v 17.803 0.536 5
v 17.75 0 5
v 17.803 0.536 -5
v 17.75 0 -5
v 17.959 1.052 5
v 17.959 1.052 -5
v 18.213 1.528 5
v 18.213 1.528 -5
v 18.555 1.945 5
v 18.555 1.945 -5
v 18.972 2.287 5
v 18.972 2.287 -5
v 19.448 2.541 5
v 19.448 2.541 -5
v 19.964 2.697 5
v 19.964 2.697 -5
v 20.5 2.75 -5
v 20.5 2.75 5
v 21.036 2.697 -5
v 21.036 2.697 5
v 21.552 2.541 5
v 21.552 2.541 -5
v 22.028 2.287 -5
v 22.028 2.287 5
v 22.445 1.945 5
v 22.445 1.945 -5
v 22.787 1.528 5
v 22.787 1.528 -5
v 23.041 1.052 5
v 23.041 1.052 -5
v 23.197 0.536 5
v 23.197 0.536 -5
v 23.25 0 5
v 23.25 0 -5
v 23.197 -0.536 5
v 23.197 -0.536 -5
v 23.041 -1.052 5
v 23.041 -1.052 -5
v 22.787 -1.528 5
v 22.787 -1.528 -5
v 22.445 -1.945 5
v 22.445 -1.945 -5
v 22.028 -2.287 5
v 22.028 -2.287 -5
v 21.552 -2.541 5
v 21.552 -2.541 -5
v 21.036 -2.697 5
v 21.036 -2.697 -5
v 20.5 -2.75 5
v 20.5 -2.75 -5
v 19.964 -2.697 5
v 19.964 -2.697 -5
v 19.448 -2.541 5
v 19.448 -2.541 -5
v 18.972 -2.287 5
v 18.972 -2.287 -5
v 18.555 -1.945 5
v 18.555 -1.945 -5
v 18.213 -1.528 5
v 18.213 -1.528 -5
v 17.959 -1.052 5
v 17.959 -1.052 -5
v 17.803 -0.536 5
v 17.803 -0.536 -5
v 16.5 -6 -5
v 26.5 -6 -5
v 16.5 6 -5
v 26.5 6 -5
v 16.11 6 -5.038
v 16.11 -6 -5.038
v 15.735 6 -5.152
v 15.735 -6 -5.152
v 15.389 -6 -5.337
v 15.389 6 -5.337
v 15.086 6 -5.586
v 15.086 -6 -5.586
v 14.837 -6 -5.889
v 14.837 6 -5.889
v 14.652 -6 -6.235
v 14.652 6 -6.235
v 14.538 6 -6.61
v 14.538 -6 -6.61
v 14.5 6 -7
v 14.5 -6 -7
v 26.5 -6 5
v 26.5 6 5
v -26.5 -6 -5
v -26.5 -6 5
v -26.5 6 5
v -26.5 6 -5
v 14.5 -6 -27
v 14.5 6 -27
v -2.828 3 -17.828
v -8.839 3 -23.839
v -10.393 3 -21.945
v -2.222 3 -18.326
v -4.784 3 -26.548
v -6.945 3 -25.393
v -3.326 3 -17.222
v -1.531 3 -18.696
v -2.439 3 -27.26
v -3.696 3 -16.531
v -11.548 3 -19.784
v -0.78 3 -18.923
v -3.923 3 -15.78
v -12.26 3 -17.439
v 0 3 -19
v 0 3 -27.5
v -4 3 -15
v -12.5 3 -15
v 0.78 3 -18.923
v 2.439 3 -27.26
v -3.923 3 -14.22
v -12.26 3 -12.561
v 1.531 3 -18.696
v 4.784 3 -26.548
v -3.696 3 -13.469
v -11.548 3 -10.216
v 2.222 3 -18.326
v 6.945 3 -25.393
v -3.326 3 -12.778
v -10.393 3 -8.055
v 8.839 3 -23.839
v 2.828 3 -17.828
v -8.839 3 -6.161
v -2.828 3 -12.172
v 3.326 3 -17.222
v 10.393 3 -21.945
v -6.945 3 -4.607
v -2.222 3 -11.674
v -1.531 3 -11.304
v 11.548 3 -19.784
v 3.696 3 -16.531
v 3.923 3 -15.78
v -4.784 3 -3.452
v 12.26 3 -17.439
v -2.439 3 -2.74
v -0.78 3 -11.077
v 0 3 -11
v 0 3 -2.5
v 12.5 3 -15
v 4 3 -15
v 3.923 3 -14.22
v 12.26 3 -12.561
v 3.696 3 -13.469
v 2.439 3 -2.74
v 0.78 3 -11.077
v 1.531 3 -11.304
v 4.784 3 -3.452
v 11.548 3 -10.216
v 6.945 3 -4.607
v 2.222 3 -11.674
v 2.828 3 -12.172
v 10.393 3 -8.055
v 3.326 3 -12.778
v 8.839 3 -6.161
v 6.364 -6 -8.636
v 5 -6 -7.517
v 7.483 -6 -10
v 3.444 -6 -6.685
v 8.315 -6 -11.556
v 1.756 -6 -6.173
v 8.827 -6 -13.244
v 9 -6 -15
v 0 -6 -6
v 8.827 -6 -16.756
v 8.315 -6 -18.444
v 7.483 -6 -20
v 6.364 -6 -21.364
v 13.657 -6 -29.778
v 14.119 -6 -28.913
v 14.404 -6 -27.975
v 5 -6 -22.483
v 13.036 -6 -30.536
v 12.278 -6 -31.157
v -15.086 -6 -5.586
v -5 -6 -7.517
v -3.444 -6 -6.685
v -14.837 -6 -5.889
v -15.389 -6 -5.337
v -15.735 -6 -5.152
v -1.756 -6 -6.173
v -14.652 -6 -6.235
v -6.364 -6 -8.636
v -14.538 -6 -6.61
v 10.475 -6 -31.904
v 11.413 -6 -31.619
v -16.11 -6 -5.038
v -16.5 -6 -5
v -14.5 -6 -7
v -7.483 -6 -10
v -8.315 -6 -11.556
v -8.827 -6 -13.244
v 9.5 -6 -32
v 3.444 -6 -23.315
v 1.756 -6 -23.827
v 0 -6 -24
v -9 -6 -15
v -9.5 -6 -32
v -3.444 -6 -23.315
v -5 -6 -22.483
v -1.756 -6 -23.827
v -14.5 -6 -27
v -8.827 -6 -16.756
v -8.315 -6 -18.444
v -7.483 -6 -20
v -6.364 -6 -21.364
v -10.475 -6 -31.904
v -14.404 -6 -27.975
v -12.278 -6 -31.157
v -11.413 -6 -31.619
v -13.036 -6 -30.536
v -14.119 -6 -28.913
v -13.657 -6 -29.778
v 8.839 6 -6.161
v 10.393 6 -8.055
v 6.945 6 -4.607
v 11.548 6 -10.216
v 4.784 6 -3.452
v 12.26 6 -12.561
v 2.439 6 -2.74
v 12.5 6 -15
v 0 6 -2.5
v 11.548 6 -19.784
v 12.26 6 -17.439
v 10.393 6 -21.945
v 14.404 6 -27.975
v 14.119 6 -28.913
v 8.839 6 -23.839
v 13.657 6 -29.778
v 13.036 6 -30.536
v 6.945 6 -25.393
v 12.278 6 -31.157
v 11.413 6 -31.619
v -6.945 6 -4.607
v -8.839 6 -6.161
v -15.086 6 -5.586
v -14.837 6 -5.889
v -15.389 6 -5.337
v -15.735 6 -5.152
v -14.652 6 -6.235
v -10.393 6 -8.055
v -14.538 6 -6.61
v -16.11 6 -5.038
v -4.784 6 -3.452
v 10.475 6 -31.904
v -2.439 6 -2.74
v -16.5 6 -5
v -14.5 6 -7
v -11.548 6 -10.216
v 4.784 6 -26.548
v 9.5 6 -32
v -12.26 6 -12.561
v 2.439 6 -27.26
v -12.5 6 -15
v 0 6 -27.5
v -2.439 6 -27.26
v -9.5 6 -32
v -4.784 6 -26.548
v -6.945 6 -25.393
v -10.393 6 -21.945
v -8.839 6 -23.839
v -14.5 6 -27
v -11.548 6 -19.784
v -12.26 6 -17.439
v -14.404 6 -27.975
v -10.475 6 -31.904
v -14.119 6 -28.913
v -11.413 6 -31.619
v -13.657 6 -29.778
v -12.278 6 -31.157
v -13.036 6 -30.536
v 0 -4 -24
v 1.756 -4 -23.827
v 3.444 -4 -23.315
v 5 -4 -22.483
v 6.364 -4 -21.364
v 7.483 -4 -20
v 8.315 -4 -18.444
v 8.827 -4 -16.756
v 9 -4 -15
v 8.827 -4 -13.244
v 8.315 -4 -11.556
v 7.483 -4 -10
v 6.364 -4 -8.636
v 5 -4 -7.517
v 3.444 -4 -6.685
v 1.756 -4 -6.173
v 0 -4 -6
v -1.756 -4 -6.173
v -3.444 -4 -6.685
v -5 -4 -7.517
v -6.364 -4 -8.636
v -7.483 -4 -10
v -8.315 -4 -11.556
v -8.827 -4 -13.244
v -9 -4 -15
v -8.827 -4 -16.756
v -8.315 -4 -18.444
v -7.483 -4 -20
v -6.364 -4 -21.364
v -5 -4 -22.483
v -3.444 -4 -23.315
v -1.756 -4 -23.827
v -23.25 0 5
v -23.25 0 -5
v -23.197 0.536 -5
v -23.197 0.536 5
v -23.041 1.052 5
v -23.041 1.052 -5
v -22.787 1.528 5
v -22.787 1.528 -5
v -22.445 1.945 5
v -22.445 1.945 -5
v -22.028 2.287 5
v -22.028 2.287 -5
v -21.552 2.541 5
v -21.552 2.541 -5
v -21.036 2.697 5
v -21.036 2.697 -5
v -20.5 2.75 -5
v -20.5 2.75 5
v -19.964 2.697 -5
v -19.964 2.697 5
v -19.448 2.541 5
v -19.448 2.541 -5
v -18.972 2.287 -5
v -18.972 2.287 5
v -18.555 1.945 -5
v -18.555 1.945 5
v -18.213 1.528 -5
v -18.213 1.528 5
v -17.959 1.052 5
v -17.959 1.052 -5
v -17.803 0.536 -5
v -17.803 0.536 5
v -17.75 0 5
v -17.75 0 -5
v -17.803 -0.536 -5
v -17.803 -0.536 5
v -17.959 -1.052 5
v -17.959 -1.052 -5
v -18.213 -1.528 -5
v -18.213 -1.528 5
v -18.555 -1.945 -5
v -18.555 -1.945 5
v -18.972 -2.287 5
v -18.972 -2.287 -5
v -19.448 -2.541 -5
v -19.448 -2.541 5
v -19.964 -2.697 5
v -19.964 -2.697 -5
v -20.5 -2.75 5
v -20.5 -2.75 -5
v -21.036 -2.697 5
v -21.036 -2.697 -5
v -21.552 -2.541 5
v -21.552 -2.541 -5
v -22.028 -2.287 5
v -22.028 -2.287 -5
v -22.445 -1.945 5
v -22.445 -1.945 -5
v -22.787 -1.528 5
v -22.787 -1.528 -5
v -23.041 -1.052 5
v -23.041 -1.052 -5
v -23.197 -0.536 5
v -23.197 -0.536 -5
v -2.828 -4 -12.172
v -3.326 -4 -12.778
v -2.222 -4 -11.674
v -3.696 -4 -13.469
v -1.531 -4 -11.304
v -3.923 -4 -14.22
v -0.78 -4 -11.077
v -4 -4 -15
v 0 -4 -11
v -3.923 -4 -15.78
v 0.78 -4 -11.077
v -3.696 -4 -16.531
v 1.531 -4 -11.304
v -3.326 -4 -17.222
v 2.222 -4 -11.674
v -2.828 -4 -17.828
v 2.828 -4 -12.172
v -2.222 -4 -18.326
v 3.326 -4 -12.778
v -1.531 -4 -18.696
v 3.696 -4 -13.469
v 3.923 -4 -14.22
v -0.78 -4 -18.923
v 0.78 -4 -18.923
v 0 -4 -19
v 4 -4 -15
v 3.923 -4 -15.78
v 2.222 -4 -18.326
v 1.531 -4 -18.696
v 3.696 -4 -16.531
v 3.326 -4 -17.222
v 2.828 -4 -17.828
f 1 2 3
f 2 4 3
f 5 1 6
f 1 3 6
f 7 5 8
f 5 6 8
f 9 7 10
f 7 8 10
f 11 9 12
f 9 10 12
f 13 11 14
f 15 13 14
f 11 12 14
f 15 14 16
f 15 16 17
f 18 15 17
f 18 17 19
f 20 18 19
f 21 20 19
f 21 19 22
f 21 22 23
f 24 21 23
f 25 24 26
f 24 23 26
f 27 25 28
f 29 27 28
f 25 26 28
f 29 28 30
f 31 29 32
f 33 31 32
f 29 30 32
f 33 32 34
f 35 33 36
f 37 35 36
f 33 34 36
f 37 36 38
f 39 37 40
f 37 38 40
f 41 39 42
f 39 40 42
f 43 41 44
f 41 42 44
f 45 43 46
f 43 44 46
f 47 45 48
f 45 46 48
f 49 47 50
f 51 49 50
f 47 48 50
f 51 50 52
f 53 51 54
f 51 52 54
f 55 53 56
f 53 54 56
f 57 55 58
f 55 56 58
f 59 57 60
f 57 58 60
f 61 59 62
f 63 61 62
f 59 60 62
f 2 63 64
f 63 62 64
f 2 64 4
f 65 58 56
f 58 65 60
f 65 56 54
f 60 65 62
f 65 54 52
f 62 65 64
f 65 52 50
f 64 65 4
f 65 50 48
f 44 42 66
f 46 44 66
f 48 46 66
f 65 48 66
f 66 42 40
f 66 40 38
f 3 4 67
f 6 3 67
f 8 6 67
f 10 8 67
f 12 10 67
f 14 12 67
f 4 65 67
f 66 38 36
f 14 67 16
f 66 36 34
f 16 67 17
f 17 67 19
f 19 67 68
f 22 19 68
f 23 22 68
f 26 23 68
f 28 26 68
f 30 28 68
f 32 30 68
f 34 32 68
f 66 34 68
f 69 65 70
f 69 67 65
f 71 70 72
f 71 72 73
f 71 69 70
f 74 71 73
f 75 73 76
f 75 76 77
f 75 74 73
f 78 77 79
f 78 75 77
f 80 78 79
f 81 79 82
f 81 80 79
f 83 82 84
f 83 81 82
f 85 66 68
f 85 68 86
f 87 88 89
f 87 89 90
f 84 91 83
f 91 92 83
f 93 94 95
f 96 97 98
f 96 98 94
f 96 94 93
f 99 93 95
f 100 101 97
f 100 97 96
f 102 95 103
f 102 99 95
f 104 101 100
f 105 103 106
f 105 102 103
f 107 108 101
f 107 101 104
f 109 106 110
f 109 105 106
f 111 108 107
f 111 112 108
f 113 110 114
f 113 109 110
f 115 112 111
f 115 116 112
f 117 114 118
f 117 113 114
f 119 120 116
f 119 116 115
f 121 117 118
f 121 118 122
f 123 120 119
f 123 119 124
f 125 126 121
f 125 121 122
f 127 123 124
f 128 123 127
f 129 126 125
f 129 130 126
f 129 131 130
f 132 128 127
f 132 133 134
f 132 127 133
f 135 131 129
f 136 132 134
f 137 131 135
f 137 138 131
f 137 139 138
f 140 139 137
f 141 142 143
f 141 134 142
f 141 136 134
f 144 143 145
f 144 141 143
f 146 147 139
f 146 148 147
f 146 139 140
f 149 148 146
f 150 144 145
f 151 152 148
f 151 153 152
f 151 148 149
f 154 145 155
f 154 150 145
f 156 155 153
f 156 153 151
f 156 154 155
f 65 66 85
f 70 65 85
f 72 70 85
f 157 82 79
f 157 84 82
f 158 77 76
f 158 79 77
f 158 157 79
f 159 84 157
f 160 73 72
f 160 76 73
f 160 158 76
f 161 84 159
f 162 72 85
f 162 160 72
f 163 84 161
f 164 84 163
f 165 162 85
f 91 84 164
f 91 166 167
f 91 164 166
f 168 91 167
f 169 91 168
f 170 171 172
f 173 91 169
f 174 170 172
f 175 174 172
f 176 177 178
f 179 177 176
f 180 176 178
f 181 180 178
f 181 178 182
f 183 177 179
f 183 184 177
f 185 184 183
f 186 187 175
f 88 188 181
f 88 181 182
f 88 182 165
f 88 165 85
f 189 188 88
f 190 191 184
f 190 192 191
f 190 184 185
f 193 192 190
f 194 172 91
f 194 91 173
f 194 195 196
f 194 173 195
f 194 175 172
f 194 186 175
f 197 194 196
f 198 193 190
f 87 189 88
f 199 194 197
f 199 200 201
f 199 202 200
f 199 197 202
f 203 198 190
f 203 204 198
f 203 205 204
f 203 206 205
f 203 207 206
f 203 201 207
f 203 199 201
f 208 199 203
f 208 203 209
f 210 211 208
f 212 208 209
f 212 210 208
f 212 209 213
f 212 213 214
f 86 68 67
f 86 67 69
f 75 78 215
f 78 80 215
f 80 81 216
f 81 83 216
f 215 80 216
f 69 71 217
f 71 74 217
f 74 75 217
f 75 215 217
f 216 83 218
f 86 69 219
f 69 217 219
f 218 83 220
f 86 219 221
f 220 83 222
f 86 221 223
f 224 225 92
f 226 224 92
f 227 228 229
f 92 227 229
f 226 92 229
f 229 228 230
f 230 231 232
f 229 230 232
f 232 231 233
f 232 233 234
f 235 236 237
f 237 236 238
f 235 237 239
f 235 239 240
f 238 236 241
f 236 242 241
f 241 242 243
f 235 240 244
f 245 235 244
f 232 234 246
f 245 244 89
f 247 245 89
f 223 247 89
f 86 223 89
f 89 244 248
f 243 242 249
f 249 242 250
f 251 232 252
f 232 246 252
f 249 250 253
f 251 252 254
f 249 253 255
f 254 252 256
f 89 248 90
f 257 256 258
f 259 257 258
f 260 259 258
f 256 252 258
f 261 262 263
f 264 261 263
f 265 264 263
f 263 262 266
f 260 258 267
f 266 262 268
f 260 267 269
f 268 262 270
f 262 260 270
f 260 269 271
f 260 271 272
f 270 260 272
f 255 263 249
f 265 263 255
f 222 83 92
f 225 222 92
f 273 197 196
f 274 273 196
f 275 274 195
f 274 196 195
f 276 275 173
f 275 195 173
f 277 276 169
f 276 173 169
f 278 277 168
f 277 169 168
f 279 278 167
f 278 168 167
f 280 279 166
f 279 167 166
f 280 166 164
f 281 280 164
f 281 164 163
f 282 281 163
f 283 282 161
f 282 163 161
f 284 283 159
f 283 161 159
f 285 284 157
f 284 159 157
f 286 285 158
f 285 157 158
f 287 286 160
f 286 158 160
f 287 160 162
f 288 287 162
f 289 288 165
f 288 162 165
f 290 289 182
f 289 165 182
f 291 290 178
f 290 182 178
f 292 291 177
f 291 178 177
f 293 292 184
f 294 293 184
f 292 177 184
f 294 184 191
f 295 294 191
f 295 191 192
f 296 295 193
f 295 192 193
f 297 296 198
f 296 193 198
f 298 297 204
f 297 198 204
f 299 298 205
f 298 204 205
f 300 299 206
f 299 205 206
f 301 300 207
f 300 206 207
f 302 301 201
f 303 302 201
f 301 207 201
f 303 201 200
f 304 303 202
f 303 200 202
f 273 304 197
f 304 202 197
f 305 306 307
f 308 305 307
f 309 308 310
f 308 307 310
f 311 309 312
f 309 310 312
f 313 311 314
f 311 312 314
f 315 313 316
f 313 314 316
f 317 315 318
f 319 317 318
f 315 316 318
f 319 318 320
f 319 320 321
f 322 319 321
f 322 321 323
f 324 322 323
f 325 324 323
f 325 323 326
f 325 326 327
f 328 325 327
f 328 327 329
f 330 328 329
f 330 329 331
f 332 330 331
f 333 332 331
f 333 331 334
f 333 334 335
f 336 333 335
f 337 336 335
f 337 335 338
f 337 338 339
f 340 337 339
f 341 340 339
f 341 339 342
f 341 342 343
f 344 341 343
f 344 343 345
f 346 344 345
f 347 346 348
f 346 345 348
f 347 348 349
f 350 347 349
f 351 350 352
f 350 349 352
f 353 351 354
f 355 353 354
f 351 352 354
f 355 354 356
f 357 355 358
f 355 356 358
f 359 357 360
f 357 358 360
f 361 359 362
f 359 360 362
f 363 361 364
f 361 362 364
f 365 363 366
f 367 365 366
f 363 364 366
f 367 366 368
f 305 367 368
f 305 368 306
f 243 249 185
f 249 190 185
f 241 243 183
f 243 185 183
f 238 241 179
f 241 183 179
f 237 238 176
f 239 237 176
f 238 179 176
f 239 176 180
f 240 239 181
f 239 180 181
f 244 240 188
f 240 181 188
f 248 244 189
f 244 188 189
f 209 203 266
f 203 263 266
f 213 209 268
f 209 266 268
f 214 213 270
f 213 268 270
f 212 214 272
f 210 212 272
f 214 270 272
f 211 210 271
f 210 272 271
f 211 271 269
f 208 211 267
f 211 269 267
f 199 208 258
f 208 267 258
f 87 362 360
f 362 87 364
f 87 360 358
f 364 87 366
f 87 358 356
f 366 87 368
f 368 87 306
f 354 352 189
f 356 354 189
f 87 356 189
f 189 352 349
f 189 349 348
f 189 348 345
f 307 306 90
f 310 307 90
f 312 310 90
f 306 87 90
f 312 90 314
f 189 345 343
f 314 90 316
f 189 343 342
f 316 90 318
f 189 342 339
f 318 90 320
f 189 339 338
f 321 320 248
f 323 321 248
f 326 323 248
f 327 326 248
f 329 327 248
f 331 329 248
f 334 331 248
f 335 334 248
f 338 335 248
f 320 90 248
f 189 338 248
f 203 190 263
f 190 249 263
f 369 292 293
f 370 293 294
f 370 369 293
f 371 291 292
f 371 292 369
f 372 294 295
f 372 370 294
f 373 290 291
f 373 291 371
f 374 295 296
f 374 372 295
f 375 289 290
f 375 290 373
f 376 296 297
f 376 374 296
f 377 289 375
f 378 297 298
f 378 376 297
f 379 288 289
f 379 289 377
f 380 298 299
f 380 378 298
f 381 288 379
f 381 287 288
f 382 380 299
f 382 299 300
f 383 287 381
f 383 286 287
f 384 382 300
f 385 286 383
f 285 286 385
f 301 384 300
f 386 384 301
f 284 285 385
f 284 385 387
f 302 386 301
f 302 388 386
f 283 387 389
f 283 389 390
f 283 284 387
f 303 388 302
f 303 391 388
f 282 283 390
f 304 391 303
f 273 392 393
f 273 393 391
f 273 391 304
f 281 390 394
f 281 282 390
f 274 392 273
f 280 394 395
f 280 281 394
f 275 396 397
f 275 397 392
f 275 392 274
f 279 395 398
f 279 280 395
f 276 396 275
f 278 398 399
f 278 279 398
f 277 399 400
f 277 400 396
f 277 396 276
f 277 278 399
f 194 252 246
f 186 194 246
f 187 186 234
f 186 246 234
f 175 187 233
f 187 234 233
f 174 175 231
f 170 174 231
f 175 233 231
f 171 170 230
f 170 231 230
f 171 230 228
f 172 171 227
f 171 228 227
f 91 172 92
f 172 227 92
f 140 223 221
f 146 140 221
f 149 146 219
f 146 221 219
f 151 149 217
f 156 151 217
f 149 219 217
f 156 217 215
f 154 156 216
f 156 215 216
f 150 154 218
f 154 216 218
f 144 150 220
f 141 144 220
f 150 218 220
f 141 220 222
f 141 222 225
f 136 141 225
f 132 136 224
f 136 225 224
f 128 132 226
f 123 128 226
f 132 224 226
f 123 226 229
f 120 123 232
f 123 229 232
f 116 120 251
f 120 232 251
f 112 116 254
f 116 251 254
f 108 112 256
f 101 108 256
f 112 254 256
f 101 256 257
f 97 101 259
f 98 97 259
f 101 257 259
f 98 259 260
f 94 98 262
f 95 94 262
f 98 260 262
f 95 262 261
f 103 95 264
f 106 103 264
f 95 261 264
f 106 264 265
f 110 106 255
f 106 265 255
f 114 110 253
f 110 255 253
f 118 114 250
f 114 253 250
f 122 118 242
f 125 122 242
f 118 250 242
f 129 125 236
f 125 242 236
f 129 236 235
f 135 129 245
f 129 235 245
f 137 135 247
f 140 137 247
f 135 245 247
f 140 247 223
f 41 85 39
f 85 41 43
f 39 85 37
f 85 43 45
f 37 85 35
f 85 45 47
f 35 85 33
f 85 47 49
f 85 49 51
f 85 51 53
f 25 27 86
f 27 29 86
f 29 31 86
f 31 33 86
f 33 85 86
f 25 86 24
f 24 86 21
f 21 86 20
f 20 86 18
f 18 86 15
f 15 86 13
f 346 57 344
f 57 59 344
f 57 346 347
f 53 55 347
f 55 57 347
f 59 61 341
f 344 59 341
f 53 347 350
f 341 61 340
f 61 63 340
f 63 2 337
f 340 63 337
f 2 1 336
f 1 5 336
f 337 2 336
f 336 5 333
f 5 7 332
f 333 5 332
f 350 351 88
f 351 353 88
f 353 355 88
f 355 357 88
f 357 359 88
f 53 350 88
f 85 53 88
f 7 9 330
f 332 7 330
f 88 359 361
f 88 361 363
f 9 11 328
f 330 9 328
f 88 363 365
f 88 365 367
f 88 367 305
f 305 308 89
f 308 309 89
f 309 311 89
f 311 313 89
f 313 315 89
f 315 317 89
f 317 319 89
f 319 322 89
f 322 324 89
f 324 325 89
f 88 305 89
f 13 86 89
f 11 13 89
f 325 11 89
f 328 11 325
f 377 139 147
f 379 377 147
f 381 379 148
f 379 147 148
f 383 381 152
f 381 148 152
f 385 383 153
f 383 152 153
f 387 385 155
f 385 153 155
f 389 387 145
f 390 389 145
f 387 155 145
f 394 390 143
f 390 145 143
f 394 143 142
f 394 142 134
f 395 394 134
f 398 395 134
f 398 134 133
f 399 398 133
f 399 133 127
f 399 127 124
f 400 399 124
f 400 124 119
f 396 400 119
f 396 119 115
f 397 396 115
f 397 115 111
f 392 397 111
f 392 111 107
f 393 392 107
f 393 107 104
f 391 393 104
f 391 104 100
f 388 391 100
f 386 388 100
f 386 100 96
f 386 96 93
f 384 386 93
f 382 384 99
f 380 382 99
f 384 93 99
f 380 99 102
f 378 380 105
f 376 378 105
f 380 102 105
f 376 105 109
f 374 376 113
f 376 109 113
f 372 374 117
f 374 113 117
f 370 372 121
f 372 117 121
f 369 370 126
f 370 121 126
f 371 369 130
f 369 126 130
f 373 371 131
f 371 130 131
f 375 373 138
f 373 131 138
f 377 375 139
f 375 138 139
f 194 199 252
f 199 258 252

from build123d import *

# Parameters (mm, degrees)
EXTRUDE_1_DEPTH     = 6
FILLET_1_R          = 2
SKETCH_2_R          = 2.75
CUT_EXTRUDE_1_DEPTH = 140
SKETCH_3_R          = 9
CUT_EXTRUDE_2_DEPTH = 2
SKETCH_5_R          = 12.5
CUT_EXTRUDE_4_DEPTH = 3
SKETCH_6_R          = 4
CUT_EXTRUDE_5_DEPTH = 76


with BuildPart() as part:
    # 草图1 → 凸台-拉伸1 (new, symmetric)
    with BuildSketch(Plane(origin=(0, 0, 0), x_dir=(1, 0, 0), z_dir=(0, 1, 0))):
        with BuildLine():
            Line((14.5, 5), (26.5, 5))
            Line((26.5, 5), (26.5, -5))
            Line((26.5, -5), (-26.5, -5))
            Line((-26.5, -5), (-26.5, 5))
            Line((-26.5, 5), (-14.5, 5))
            Line((-14.5, 5), (-14.5, 27))
            ThreePointArc((-14.5, 27), (-13.035533906, 30.535533906), (-9.5, 32))
            Line((-9.5, 32), (9.5, 32))
            ThreePointArc((9.5, 32), (13.035533906, 30.535533906), (14.5, 27))
            Line((14.5, 27), (14.5, 5))
        make_face()
    extrude(amount=EXTRUDE_1_DEPTH, both=True)

    # 圆角1
    fillet_1_edges = [part.edges().sort_by_distance(p)[0] for p in [
        (-14.5, 0, -5),
        (14.5, 0, -5),
    ]]
    fillet(fillet_1_edges, radius=FILLET_1_R)

    # 草图2 → 切除-拉伸1 (cut, symmetric)
    with BuildSketch(Plane(origin=(0, 0, -5), x_dir=(-1, 0, 0), z_dir=(0, 0, -1))):
        with Locations((20.5, 0)):
            Circle(SKETCH_2_R)
        with Locations((-20.5, 0)):
            Circle(SKETCH_2_R)
    extrude(amount=CUT_EXTRUDE_1_DEPTH, both=True, mode=Mode.SUBTRACT)

    # 草图3 → 切除-拉伸2 (cut)
    with BuildSketch(Plane.XZ.offset(6)):
        with Locations(Location((0, -15, 0), (0, 0, 270))):
            Circle(SKETCH_3_R)
    extrude(amount=-CUT_EXTRUDE_2_DEPTH, mode=Mode.SUBTRACT)

    # 草图5 → 切除-拉伸4 (cut)
    with BuildSketch(Plane(origin=(0, 6, 0), x_dir=(1, 0, 0), z_dir=(0, 1, 0))):
        with Locations(Location((0, 15, 0), (0, 0, 270))):
            Circle(SKETCH_5_R)
    extrude(amount=-CUT_EXTRUDE_4_DEPTH, mode=Mode.SUBTRACT)

    # 草图6 → 切除-拉伸5 (cut)
    with BuildSketch(Plane(origin=(0, 3, 0), x_dir=(1, 0, 0), z_dir=(0, 1, 0))):
        with Locations(Location((0, 15, 0), (0, 0, 270))):
            Circle(SKETCH_6_R)
    extrude(amount=-CUT_EXTRUDE_5_DEPTH, mode=Mode.SUBTRACT)


solid = part.part
